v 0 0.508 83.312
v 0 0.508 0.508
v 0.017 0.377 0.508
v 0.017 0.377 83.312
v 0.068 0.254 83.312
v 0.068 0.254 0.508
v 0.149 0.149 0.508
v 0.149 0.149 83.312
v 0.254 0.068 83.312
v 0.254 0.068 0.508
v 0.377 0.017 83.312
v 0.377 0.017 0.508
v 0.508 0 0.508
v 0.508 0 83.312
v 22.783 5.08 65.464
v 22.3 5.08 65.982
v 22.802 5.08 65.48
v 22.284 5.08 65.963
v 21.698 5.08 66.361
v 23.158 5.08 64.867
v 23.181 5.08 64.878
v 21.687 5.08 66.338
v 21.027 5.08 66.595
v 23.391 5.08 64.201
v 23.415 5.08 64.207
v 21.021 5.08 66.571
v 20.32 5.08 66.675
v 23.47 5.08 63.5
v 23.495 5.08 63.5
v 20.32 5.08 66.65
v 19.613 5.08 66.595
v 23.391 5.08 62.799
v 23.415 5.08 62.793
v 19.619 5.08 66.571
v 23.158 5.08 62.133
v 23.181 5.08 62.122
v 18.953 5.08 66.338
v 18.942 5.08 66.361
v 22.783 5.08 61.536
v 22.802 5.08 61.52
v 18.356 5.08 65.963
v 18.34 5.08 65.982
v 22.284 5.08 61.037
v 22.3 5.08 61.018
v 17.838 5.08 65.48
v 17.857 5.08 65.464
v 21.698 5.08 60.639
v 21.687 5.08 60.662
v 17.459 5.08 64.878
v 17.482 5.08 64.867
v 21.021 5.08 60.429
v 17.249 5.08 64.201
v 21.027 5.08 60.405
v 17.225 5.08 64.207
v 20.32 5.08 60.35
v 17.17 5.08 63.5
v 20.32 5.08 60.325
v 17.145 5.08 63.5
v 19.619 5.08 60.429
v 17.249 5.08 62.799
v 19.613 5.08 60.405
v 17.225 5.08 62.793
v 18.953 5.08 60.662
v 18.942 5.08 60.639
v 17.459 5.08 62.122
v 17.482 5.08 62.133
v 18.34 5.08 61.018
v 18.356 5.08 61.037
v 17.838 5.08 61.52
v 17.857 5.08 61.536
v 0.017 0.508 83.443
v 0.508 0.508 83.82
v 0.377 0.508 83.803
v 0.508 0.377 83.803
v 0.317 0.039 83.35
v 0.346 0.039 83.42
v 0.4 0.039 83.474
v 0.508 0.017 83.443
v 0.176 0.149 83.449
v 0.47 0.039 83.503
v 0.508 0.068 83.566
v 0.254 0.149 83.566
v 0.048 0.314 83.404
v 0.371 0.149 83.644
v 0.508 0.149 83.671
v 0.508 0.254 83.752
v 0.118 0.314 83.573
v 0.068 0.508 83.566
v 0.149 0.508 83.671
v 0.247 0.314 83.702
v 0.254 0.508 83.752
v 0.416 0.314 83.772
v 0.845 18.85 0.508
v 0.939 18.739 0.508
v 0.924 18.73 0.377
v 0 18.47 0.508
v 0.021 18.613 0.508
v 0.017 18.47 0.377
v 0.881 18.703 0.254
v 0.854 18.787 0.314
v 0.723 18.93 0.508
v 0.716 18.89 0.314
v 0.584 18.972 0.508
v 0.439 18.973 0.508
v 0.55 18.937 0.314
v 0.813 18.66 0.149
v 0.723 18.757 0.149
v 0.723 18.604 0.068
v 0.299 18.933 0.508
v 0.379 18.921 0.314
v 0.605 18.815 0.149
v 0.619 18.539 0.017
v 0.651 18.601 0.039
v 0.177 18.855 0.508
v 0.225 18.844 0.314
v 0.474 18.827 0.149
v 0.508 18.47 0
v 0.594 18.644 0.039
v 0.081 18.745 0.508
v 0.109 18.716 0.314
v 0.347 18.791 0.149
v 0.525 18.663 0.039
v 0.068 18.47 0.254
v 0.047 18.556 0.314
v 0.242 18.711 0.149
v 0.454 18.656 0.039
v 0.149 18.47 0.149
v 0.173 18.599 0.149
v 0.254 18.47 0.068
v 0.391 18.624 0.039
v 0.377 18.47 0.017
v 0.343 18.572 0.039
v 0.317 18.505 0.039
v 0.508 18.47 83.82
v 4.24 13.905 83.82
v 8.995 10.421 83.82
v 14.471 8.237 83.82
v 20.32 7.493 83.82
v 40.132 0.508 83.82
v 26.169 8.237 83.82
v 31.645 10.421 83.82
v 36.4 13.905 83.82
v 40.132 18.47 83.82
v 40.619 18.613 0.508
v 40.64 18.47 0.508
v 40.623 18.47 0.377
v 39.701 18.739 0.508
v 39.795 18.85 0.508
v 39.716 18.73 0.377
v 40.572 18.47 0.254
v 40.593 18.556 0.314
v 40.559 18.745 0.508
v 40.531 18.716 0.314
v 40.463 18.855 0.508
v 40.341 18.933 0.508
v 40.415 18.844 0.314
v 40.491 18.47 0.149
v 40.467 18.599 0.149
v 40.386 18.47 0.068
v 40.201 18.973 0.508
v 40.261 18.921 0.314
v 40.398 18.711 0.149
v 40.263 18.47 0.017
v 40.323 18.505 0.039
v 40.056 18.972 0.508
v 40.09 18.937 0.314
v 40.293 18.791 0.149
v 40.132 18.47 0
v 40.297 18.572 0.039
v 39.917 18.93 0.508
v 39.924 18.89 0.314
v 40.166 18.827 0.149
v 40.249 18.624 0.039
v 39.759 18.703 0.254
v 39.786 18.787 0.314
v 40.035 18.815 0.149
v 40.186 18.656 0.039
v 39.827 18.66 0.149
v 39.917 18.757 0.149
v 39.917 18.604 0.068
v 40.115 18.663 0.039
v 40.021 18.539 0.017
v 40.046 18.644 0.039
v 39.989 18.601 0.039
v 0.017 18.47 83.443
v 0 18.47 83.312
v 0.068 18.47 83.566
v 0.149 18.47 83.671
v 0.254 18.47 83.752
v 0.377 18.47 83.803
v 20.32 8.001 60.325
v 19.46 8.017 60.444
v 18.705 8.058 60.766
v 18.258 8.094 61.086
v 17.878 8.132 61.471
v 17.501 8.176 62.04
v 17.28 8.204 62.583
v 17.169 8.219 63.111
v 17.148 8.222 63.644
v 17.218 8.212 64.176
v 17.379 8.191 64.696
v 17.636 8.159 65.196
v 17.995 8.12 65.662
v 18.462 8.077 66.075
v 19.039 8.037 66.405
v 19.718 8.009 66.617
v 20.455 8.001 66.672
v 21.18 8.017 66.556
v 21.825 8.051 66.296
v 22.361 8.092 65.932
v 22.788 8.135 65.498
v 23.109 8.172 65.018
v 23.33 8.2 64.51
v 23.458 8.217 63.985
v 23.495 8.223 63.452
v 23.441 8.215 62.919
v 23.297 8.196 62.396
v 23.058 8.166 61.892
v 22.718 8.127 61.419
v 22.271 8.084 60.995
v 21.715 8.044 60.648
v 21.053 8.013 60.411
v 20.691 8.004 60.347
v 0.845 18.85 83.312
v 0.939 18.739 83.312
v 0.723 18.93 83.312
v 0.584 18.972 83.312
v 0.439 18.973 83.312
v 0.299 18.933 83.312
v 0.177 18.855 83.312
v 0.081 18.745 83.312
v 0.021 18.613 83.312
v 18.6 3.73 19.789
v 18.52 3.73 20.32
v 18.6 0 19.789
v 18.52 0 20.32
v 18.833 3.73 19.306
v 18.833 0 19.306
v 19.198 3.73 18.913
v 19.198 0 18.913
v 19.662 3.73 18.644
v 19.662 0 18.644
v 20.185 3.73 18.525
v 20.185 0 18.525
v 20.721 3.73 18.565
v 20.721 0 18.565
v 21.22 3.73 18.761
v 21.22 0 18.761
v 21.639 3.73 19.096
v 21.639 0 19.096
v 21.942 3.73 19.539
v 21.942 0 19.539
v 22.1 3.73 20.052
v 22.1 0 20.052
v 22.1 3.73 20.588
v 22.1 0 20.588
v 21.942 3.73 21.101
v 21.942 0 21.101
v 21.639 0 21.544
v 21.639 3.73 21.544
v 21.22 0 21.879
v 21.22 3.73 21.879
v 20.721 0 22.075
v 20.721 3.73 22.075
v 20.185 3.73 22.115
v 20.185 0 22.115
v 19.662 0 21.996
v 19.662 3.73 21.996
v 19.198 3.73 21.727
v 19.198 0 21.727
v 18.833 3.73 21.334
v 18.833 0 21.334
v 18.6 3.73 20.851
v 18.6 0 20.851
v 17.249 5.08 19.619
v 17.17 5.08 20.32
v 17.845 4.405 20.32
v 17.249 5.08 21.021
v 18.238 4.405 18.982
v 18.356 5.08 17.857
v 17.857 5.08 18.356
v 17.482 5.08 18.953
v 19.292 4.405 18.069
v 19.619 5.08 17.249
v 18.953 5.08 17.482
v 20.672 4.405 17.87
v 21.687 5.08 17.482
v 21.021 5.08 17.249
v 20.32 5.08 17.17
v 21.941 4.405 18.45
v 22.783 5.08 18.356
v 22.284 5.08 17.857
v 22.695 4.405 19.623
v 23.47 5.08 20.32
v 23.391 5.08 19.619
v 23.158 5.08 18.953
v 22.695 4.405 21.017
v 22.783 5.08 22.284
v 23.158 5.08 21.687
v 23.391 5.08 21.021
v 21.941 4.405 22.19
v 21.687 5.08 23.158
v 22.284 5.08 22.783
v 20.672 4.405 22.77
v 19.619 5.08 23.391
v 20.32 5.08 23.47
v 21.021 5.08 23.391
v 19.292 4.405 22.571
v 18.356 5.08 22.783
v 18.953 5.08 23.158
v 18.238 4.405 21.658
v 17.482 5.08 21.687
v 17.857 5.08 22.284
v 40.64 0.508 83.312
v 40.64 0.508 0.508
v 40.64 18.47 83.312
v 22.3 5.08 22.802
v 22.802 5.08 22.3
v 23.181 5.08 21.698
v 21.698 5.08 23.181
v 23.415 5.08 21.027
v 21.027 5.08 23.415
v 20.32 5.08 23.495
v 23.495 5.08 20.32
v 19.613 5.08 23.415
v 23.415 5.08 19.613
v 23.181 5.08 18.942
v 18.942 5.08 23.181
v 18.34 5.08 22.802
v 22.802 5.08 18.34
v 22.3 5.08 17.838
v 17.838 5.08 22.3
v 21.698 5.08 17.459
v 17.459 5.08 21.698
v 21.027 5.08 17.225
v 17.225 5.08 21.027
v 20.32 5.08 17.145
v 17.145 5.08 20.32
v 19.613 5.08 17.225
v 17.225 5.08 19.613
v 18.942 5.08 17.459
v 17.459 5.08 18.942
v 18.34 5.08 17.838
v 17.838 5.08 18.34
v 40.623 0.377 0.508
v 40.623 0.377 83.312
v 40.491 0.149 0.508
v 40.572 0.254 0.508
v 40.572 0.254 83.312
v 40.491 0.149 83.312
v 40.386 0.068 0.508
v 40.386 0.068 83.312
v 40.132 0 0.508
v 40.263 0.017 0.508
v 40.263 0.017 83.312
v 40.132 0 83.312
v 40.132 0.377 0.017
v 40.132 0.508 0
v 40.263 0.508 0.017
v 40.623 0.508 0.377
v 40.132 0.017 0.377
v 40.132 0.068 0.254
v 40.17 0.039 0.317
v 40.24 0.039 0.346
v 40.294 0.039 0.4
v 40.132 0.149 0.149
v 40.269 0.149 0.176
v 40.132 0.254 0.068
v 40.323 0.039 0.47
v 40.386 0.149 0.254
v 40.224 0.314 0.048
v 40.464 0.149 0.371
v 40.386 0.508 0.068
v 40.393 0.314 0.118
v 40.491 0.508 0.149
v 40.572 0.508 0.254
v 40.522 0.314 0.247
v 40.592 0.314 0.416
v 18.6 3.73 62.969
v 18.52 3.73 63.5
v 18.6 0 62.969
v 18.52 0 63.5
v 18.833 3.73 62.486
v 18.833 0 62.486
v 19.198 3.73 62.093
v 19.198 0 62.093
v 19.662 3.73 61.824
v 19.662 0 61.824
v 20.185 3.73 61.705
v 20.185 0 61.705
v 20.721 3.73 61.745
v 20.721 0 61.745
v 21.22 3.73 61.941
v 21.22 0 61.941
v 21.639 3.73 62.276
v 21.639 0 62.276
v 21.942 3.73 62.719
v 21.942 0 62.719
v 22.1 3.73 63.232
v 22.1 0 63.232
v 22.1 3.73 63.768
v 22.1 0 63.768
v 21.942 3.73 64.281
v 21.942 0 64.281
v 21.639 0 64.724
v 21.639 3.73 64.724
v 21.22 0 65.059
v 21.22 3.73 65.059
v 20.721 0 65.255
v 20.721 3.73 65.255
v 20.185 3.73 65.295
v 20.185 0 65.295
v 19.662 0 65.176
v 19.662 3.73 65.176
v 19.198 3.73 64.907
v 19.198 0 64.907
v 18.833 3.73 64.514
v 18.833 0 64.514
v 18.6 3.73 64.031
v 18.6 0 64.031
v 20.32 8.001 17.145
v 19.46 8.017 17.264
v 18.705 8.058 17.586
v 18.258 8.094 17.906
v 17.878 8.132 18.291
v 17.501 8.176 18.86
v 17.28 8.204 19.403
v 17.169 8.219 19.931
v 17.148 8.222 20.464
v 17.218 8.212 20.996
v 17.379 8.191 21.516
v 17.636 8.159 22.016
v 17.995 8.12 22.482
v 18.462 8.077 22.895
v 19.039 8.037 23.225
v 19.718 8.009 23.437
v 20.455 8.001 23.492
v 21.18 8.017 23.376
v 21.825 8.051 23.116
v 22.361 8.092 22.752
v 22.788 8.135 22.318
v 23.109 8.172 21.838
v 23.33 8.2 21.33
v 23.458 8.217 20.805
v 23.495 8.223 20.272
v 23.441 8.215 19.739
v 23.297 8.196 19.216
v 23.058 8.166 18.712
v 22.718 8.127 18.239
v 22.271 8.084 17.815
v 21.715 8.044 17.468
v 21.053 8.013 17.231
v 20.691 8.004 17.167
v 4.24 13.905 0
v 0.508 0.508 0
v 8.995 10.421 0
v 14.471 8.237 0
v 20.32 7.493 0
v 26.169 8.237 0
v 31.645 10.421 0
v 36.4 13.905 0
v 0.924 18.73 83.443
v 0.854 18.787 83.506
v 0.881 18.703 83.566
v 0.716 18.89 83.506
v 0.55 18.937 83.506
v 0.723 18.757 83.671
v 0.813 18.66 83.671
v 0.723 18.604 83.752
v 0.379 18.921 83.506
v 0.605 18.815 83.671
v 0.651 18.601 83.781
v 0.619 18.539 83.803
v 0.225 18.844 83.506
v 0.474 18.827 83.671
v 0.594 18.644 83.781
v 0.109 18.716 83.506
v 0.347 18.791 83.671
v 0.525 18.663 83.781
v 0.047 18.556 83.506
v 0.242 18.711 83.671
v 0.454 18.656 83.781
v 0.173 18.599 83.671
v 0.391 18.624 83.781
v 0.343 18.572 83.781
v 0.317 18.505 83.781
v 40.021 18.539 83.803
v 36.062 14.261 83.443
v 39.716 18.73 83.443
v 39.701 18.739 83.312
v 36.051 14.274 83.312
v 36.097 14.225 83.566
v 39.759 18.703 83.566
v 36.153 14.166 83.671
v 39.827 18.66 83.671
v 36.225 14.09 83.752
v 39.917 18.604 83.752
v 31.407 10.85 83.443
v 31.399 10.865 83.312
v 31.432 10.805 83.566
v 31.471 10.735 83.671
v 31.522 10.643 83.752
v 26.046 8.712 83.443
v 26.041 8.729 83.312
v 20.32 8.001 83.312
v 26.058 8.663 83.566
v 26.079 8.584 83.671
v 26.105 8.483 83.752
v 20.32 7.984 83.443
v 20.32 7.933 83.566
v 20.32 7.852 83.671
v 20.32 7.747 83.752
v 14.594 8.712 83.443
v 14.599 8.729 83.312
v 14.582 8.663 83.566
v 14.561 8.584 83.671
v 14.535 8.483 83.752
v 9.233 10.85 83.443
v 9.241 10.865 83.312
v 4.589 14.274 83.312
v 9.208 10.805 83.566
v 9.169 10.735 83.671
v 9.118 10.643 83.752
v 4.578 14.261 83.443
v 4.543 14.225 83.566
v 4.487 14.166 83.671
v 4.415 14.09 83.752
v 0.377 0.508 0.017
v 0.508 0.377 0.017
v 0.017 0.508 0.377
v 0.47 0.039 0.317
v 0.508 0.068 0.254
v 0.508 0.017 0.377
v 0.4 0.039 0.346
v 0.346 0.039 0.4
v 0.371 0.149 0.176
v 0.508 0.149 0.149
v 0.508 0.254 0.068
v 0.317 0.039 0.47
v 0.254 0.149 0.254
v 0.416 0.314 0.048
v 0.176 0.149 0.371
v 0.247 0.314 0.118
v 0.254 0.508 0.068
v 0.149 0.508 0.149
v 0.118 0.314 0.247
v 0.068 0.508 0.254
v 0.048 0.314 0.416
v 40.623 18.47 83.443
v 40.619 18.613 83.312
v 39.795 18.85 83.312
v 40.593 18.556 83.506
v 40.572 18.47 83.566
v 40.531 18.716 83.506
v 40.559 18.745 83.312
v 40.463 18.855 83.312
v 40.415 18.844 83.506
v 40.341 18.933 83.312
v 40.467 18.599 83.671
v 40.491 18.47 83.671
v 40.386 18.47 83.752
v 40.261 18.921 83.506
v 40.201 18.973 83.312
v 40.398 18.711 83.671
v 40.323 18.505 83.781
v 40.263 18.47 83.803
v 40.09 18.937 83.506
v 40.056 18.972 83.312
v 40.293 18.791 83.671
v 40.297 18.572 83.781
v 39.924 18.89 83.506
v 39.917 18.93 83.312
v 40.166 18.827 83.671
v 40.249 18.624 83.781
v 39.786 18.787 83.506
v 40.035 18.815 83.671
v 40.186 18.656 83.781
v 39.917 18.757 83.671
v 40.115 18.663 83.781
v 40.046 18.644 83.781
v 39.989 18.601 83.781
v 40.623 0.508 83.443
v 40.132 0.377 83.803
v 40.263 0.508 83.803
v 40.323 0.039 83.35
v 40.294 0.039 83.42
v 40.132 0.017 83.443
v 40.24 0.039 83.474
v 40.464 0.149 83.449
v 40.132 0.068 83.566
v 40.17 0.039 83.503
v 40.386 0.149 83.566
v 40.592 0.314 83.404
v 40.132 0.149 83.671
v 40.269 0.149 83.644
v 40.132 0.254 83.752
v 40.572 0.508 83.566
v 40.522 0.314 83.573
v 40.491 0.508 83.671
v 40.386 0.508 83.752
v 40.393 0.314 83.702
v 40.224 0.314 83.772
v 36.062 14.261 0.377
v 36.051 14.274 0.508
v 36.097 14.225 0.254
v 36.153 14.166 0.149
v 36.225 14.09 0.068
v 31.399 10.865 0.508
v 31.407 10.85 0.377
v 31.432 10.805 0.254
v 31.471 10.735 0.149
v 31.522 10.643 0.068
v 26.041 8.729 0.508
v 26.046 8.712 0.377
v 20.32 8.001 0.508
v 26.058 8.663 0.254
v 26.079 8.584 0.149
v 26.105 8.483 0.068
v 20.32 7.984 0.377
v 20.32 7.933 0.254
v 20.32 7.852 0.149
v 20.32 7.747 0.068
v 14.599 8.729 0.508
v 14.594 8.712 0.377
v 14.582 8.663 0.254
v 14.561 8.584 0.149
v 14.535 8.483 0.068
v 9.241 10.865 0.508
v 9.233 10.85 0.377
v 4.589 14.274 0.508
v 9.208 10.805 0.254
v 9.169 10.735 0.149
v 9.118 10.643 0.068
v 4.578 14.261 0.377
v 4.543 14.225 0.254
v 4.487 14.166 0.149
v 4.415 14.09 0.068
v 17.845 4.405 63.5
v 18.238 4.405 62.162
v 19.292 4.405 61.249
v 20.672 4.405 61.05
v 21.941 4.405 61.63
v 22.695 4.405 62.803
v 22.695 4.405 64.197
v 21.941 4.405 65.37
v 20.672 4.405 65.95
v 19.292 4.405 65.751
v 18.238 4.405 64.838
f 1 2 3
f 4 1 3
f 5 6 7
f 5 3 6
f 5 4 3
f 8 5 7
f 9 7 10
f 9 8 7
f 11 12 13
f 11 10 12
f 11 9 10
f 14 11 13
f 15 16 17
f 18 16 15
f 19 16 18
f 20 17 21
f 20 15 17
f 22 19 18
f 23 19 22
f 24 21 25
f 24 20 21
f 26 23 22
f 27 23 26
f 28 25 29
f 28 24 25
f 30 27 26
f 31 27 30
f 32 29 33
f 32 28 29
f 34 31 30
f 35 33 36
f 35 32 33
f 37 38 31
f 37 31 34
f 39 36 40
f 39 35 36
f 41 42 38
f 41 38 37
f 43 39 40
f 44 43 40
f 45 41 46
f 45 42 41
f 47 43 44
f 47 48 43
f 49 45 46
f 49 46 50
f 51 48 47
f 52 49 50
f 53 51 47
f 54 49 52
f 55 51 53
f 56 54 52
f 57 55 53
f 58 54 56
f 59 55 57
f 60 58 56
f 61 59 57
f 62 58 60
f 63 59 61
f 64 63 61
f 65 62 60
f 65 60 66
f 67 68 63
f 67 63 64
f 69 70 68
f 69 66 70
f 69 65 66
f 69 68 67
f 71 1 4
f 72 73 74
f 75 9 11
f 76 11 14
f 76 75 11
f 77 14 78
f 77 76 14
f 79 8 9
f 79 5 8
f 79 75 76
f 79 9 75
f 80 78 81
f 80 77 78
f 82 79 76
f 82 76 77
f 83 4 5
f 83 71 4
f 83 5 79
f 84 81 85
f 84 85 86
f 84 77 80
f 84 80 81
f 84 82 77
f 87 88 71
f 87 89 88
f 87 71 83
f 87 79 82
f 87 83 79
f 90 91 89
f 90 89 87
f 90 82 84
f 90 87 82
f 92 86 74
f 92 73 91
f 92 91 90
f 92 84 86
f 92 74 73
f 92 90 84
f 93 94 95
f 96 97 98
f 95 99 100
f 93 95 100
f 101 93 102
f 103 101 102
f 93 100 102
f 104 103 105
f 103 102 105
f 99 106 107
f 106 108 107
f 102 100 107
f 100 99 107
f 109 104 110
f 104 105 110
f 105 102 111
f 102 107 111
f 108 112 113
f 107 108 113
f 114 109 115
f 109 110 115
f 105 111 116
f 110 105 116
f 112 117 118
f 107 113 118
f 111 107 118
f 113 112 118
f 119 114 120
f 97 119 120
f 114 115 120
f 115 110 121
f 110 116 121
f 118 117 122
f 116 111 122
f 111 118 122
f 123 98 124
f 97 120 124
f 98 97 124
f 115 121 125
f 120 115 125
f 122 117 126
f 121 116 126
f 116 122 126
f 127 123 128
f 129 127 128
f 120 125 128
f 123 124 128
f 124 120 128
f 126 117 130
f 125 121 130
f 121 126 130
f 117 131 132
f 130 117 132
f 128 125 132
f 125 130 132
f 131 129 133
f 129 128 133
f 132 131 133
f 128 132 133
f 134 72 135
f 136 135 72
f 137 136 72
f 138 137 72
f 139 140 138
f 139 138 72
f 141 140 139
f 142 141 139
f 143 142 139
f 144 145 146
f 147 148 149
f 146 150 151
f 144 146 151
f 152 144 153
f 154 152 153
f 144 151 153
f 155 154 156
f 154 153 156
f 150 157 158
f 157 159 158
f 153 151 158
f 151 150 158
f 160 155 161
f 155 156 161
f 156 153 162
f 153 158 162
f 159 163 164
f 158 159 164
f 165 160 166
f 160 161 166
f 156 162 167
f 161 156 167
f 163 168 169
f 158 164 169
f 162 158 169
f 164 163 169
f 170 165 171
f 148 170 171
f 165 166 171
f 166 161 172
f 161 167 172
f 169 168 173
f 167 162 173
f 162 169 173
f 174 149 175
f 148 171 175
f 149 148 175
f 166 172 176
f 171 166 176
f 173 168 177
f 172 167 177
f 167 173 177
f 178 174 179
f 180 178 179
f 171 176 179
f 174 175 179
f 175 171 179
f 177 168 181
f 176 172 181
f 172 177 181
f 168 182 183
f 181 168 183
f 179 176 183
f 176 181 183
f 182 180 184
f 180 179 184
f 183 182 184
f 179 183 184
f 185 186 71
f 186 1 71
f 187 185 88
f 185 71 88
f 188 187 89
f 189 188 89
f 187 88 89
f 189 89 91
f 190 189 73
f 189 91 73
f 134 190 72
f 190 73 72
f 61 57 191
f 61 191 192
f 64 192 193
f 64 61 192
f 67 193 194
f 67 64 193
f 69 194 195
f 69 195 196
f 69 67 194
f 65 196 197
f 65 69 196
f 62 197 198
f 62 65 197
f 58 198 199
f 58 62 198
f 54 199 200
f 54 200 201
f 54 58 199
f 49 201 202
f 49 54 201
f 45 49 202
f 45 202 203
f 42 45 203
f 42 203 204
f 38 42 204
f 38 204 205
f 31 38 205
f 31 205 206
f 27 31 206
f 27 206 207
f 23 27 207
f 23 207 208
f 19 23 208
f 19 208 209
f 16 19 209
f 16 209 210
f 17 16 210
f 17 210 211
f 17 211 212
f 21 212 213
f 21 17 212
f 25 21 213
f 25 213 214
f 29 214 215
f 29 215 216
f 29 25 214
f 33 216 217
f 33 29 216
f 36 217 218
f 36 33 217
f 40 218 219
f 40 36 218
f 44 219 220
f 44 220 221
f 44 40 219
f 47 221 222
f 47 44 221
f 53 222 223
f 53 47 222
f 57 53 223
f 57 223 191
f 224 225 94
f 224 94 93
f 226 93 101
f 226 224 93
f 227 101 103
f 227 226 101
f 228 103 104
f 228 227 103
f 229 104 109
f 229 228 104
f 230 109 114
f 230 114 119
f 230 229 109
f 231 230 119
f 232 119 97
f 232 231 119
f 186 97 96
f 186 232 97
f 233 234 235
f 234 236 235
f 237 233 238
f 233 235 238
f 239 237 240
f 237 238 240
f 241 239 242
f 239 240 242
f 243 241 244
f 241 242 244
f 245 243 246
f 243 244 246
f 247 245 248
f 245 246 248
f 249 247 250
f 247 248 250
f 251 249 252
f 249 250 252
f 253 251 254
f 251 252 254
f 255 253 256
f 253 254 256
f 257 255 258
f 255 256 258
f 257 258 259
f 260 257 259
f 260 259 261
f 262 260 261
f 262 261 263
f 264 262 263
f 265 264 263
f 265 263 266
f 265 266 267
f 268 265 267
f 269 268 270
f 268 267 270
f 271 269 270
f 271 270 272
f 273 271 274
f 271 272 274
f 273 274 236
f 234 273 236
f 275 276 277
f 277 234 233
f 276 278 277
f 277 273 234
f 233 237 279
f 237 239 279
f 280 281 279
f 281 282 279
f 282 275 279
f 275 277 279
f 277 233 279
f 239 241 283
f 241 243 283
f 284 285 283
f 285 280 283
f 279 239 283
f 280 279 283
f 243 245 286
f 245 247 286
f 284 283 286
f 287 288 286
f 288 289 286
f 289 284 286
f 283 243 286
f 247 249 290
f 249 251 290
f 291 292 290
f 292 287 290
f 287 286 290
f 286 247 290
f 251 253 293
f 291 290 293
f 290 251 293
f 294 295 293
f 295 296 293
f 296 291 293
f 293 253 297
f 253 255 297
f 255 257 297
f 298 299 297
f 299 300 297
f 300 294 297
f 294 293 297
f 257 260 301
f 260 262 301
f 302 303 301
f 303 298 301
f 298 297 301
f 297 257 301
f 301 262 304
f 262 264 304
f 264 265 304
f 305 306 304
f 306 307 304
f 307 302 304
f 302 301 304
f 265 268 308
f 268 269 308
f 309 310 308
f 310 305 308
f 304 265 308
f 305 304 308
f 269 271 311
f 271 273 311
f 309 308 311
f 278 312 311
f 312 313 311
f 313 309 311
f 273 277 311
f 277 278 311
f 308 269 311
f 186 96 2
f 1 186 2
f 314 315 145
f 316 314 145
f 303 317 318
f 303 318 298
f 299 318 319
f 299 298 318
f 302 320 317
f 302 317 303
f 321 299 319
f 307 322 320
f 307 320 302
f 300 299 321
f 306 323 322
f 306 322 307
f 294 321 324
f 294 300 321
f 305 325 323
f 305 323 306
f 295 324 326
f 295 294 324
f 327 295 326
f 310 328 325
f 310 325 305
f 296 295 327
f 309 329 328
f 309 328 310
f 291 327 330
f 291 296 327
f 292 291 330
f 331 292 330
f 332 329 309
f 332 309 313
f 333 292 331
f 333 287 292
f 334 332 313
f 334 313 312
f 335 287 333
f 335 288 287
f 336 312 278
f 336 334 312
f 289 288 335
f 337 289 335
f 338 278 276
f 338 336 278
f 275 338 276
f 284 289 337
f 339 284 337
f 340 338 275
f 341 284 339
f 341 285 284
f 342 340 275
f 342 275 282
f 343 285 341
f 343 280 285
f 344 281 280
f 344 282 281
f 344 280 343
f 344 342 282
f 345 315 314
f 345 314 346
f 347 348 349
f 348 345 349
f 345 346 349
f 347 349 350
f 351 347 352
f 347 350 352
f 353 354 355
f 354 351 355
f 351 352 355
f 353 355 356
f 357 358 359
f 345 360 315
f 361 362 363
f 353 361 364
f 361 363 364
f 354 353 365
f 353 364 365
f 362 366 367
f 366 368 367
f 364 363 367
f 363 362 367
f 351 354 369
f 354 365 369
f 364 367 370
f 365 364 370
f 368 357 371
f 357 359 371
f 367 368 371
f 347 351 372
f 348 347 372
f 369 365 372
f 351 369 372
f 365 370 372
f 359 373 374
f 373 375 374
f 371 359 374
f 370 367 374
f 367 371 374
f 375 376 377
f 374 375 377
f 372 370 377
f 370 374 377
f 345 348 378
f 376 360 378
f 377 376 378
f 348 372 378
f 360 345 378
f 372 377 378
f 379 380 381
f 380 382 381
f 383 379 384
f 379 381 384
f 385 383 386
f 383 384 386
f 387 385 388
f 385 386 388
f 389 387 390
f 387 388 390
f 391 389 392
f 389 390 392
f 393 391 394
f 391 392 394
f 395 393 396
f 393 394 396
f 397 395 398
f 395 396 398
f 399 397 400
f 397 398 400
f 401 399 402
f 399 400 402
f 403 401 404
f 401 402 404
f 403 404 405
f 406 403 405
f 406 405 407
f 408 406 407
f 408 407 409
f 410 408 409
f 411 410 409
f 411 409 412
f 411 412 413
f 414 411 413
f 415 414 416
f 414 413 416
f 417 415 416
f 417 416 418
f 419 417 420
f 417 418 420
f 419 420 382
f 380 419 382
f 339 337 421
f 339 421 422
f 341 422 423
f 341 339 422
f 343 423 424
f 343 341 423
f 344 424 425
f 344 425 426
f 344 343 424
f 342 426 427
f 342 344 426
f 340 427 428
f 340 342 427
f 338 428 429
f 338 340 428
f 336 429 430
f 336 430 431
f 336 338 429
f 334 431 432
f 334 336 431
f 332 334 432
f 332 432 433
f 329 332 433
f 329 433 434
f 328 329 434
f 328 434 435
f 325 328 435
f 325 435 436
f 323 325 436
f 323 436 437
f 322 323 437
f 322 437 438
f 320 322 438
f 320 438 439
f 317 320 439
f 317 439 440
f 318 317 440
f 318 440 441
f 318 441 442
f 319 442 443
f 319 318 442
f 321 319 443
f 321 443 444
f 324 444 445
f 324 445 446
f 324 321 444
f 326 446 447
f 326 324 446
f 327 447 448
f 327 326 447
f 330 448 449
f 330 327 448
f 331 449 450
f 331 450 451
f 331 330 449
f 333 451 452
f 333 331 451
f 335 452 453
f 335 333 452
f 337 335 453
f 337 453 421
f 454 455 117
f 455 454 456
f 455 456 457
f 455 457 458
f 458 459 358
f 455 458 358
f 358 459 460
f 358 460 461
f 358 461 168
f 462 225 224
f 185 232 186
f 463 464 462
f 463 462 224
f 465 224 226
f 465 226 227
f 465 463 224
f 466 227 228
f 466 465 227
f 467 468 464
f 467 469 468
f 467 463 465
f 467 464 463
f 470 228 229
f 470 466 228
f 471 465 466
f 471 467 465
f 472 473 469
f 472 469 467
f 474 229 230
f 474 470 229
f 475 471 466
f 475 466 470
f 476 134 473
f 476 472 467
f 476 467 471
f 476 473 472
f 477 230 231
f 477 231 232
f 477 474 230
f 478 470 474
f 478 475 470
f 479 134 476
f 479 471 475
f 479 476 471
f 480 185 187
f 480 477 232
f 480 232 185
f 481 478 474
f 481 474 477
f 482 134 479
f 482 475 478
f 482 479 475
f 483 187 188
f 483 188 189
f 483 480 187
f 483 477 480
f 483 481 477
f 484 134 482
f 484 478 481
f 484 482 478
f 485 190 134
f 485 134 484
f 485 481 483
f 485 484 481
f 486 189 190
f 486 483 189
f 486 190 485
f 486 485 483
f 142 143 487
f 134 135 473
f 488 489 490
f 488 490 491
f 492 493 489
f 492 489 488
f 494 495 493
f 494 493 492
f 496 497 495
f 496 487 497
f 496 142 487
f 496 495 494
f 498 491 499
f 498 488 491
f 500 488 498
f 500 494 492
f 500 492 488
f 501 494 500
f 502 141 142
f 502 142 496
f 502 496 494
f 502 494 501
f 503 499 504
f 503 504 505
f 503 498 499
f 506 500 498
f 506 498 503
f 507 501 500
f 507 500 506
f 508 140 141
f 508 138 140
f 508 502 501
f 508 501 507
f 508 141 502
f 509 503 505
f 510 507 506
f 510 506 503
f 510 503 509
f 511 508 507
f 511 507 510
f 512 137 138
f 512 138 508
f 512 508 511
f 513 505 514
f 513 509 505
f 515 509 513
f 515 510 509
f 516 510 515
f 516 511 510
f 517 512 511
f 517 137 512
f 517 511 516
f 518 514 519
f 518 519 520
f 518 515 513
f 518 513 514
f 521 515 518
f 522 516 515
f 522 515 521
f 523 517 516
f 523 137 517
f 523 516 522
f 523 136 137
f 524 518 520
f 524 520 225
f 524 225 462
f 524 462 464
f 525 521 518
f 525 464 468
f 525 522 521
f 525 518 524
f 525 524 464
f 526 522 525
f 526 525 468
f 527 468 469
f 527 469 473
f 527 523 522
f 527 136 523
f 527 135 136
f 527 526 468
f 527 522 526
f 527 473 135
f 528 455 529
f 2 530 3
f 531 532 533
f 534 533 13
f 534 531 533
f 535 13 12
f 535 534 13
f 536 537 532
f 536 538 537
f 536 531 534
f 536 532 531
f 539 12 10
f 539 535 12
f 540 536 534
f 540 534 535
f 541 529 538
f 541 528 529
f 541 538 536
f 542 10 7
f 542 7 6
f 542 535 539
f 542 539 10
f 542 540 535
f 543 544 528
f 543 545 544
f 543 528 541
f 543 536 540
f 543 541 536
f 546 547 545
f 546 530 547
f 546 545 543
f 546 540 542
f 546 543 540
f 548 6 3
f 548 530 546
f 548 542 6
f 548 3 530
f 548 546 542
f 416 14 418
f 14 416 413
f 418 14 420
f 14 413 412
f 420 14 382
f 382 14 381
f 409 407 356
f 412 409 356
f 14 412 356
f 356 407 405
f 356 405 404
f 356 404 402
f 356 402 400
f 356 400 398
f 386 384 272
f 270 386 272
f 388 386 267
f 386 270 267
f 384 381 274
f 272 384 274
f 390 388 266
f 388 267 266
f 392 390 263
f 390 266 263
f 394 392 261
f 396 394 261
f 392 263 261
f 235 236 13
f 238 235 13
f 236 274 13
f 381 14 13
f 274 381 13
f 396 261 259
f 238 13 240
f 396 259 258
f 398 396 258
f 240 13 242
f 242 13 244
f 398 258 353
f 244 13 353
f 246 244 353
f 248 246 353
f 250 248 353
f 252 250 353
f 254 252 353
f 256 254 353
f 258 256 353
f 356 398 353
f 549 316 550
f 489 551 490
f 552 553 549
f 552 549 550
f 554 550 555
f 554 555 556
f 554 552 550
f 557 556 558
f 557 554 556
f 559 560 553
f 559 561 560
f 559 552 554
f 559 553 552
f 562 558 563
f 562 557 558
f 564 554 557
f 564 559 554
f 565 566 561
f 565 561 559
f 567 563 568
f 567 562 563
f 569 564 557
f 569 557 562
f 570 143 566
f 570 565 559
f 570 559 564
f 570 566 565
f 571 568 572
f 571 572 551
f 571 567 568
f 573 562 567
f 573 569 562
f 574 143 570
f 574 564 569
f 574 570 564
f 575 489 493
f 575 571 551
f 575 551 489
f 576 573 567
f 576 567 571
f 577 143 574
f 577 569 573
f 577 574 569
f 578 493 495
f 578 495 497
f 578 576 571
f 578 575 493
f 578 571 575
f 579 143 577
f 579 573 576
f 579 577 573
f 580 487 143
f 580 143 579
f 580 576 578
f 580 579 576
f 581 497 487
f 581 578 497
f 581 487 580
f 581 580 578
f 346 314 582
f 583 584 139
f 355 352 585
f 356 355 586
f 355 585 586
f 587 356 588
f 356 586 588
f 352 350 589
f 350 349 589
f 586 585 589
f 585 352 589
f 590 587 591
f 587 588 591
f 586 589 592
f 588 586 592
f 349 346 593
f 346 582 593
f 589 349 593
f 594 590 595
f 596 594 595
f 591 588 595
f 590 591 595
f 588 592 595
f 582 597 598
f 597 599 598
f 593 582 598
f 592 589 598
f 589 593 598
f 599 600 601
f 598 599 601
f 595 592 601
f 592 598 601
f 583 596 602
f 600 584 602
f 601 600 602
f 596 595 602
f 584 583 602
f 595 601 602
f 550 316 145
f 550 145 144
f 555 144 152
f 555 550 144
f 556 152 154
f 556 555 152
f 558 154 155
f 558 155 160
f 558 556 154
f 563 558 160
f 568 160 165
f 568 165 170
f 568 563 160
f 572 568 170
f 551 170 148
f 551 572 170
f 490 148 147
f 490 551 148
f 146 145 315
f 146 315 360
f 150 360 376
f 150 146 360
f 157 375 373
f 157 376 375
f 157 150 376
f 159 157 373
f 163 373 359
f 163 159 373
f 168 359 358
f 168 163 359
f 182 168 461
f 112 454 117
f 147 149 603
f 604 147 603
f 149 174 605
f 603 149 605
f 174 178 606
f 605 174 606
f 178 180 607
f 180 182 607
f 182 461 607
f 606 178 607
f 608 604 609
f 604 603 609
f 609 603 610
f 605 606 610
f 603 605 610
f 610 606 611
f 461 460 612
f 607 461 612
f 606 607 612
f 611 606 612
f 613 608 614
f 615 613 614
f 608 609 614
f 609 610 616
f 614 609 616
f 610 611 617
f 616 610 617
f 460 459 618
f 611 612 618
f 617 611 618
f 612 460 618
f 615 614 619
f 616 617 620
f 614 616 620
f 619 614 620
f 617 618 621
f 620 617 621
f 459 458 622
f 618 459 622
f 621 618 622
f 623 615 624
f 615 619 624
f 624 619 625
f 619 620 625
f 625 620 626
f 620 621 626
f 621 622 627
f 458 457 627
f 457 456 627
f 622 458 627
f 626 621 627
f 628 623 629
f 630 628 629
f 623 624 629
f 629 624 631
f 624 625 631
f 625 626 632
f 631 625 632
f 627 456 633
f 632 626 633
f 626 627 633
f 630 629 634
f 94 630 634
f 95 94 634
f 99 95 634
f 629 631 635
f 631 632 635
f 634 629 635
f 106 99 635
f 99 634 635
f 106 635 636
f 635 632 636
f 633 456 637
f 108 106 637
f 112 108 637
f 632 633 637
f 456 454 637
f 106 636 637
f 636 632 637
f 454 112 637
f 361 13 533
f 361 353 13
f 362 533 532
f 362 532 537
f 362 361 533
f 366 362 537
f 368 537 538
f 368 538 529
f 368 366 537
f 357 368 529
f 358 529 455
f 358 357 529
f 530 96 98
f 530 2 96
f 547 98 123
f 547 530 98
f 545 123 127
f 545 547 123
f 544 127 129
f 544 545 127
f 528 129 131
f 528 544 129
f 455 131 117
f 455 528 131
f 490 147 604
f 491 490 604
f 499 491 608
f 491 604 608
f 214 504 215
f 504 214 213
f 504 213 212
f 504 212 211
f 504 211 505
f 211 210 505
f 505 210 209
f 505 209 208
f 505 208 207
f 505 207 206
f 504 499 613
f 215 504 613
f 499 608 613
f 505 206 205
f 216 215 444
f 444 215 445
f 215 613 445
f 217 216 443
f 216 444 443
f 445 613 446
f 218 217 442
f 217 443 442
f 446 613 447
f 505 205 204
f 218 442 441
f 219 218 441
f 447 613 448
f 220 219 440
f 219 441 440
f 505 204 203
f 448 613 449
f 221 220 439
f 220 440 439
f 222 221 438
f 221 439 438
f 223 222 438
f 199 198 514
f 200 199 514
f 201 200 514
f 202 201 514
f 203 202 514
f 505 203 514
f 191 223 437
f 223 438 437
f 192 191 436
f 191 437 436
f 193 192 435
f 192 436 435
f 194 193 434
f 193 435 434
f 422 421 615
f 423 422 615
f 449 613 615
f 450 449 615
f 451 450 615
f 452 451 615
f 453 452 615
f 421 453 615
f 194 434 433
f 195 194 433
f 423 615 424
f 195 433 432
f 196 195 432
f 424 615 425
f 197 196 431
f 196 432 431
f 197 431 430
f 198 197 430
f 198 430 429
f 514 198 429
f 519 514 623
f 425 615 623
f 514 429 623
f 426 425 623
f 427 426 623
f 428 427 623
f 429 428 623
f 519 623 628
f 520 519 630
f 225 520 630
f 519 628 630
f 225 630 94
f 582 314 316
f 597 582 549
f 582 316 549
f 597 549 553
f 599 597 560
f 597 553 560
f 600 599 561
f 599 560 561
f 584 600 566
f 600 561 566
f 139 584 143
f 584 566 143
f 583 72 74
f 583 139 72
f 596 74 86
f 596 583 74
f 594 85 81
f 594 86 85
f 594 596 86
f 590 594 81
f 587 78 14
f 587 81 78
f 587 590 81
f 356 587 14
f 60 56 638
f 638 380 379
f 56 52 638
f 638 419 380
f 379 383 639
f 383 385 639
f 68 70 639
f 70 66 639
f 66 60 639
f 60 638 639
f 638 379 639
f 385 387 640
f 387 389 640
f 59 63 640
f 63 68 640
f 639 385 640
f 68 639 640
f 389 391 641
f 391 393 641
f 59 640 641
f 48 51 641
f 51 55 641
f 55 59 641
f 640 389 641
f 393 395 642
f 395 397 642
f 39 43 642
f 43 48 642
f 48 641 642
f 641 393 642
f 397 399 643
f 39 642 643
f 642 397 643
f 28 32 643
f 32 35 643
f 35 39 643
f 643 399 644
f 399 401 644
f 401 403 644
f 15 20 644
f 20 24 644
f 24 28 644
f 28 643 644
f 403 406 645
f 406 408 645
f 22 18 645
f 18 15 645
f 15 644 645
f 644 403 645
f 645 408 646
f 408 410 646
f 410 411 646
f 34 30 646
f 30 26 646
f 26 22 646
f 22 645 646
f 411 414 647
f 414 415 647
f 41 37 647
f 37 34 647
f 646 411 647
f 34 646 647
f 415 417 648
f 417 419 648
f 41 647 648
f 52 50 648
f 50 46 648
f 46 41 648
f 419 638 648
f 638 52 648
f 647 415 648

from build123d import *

# Parameters (mm, degrees)
BOSS_EXTRUDE1_DEPTH                                 = 83.82
FILLET1_R                                           = 0.508
CUT_EXTRUDE1_START                                  = 5.08
SKETCH5_R                                           = 3.175
CUT_EXTRUDE1_DEPTH                                  = 90.986026172
CSK_FOR_M3_COUNTERSUNK_FLAT_HEAD_SCREW1_D           = 3.6
CSK_FOR_M3_COUNTERSUNK_FLAT_HEAD_SCREW1_DEPTH       = 419.354
CSK_FOR_M3_COUNTERSUNK_FLAT_HEAD_SCREW1_CSINK_D     = 6.3
CSK_FOR_M3_COUNTERSUNK_FLAT_HEAD_SCREW1_CSINK_ANGLE = 90
CSK_FOR_M3_COUNTERSUNK_FLAT_HEAD_SCREW1_TIP         = 1.081549114
FILLET2_R                                           = 0.508


with BuildPart() as part:
    # Sketch2 → Boss-Extrude1 (new body)
    with BuildSketch(Plane.XY):
        with BuildLine():
            Line((0, 0), (40.64, 0))
            Line((40.64, 0), (40.64, 20.388311711))
            ThreePointArc((40.64, 20.388311711), (20.32, 8.001), (0, 20.388311711))
            Line((0, 20.388311711), (0, 0))
        make_face()
    extrude(amount=BOSS_EXTRUDE1_DEPTH)

    # Fillet1
    fillet1_edges = [part.edges().sort_by_distance(p)[0] for p in [
        (0, 20.388311711, 41.91),
        (40.64, 20.388311711, 41.91),
    ]]
    fillet(fillet1_edges, radius=FILLET1_R)

    # Sketch5 → Cut-Extrude1 (cut, through all)
    with BuildSketch(Plane(origin=(0, 0, 0), x_dir=(1, 0, 0), z_dir=(0, 1, 0)).offset(CUT_EXTRUDE1_START)):
        with Locations(Location((20.32, -20.32, 0), (0, 0, 90))):
            Circle(SKETCH5_R)
        with Locations(Location((20.32, -63.5, 0), (0, 0, 90))):
            Circle(SKETCH5_R)
    extrude(amount=CUT_EXTRUDE1_DEPTH, mode=Mode.SUBTRACT)

    # CSK for M3 Countersunk Flat Head Screw1
    with Locations(Plane(origin=(0, 5.08, 0), x_dir=(1, 0, 0), z_dir=(0, 1, 0))):
        with Locations((20.32, -20.32), (20.32, -63.5)):
            CounterSinkHole(CSK_FOR_M3_COUNTERSUNK_FLAT_HEAD_SCREW1_D / 2, CSK_FOR_M3_COUNTERSUNK_FLAT_HEAD_SCREW1_CSINK_D / 2, depth=CSK_FOR_M3_COUNTERSUNK_FLAT_HEAD_SCREW1_DEPTH, counter_sink_angle=CSK_FOR_M3_COUNTERSUNK_FLAT_HEAD_SCREW1_CSINK_ANGLE)
            with Locations((0, 0, -(CSK_FOR_M3_COUNTERSUNK_FLAT_HEAD_SCREW1_DEPTH + CSK_FOR_M3_COUNTERSUNK_FLAT_HEAD_SCREW1_TIP / 2))):  # 118° drill point
                Cone(0, CSK_FOR_M3_COUNTERSUNK_FLAT_HEAD_SCREW1_D / 2, CSK_FOR_M3_COUNTERSUNK_FLAT_HEAD_SCREW1_TIP, mode=Mode.SUBTRACT)

    # Fillet2
    fillet2_edges = [part.edges().sort_by_distance(p)[0] for p in [
        (40.64, 9.234774054, 83.82),
        (20.32, 8.001, 0),
        (20.32, 8.001, 83.82),
        (0, 9.234774054, 0),
        (0.36787397, 18.957839717, 0),
        (40.27212603, 18.957839717, 0),
        (0, 9.234774054, 83.82),
        (0.36787397, 18.957839717, 83.82),
        (40.27212603, 18.957839717, 83.82),
        (40.64, 9.234774054, 0),
        (20.32, 0, 0),
        (40.64, 0, 41.91),
        (0, 0, 41.91),
        (20.32, 0, 83.82),
    ]]
    fillet(fillet2_edges, radius=FILLET2_R)


solid = part.part
